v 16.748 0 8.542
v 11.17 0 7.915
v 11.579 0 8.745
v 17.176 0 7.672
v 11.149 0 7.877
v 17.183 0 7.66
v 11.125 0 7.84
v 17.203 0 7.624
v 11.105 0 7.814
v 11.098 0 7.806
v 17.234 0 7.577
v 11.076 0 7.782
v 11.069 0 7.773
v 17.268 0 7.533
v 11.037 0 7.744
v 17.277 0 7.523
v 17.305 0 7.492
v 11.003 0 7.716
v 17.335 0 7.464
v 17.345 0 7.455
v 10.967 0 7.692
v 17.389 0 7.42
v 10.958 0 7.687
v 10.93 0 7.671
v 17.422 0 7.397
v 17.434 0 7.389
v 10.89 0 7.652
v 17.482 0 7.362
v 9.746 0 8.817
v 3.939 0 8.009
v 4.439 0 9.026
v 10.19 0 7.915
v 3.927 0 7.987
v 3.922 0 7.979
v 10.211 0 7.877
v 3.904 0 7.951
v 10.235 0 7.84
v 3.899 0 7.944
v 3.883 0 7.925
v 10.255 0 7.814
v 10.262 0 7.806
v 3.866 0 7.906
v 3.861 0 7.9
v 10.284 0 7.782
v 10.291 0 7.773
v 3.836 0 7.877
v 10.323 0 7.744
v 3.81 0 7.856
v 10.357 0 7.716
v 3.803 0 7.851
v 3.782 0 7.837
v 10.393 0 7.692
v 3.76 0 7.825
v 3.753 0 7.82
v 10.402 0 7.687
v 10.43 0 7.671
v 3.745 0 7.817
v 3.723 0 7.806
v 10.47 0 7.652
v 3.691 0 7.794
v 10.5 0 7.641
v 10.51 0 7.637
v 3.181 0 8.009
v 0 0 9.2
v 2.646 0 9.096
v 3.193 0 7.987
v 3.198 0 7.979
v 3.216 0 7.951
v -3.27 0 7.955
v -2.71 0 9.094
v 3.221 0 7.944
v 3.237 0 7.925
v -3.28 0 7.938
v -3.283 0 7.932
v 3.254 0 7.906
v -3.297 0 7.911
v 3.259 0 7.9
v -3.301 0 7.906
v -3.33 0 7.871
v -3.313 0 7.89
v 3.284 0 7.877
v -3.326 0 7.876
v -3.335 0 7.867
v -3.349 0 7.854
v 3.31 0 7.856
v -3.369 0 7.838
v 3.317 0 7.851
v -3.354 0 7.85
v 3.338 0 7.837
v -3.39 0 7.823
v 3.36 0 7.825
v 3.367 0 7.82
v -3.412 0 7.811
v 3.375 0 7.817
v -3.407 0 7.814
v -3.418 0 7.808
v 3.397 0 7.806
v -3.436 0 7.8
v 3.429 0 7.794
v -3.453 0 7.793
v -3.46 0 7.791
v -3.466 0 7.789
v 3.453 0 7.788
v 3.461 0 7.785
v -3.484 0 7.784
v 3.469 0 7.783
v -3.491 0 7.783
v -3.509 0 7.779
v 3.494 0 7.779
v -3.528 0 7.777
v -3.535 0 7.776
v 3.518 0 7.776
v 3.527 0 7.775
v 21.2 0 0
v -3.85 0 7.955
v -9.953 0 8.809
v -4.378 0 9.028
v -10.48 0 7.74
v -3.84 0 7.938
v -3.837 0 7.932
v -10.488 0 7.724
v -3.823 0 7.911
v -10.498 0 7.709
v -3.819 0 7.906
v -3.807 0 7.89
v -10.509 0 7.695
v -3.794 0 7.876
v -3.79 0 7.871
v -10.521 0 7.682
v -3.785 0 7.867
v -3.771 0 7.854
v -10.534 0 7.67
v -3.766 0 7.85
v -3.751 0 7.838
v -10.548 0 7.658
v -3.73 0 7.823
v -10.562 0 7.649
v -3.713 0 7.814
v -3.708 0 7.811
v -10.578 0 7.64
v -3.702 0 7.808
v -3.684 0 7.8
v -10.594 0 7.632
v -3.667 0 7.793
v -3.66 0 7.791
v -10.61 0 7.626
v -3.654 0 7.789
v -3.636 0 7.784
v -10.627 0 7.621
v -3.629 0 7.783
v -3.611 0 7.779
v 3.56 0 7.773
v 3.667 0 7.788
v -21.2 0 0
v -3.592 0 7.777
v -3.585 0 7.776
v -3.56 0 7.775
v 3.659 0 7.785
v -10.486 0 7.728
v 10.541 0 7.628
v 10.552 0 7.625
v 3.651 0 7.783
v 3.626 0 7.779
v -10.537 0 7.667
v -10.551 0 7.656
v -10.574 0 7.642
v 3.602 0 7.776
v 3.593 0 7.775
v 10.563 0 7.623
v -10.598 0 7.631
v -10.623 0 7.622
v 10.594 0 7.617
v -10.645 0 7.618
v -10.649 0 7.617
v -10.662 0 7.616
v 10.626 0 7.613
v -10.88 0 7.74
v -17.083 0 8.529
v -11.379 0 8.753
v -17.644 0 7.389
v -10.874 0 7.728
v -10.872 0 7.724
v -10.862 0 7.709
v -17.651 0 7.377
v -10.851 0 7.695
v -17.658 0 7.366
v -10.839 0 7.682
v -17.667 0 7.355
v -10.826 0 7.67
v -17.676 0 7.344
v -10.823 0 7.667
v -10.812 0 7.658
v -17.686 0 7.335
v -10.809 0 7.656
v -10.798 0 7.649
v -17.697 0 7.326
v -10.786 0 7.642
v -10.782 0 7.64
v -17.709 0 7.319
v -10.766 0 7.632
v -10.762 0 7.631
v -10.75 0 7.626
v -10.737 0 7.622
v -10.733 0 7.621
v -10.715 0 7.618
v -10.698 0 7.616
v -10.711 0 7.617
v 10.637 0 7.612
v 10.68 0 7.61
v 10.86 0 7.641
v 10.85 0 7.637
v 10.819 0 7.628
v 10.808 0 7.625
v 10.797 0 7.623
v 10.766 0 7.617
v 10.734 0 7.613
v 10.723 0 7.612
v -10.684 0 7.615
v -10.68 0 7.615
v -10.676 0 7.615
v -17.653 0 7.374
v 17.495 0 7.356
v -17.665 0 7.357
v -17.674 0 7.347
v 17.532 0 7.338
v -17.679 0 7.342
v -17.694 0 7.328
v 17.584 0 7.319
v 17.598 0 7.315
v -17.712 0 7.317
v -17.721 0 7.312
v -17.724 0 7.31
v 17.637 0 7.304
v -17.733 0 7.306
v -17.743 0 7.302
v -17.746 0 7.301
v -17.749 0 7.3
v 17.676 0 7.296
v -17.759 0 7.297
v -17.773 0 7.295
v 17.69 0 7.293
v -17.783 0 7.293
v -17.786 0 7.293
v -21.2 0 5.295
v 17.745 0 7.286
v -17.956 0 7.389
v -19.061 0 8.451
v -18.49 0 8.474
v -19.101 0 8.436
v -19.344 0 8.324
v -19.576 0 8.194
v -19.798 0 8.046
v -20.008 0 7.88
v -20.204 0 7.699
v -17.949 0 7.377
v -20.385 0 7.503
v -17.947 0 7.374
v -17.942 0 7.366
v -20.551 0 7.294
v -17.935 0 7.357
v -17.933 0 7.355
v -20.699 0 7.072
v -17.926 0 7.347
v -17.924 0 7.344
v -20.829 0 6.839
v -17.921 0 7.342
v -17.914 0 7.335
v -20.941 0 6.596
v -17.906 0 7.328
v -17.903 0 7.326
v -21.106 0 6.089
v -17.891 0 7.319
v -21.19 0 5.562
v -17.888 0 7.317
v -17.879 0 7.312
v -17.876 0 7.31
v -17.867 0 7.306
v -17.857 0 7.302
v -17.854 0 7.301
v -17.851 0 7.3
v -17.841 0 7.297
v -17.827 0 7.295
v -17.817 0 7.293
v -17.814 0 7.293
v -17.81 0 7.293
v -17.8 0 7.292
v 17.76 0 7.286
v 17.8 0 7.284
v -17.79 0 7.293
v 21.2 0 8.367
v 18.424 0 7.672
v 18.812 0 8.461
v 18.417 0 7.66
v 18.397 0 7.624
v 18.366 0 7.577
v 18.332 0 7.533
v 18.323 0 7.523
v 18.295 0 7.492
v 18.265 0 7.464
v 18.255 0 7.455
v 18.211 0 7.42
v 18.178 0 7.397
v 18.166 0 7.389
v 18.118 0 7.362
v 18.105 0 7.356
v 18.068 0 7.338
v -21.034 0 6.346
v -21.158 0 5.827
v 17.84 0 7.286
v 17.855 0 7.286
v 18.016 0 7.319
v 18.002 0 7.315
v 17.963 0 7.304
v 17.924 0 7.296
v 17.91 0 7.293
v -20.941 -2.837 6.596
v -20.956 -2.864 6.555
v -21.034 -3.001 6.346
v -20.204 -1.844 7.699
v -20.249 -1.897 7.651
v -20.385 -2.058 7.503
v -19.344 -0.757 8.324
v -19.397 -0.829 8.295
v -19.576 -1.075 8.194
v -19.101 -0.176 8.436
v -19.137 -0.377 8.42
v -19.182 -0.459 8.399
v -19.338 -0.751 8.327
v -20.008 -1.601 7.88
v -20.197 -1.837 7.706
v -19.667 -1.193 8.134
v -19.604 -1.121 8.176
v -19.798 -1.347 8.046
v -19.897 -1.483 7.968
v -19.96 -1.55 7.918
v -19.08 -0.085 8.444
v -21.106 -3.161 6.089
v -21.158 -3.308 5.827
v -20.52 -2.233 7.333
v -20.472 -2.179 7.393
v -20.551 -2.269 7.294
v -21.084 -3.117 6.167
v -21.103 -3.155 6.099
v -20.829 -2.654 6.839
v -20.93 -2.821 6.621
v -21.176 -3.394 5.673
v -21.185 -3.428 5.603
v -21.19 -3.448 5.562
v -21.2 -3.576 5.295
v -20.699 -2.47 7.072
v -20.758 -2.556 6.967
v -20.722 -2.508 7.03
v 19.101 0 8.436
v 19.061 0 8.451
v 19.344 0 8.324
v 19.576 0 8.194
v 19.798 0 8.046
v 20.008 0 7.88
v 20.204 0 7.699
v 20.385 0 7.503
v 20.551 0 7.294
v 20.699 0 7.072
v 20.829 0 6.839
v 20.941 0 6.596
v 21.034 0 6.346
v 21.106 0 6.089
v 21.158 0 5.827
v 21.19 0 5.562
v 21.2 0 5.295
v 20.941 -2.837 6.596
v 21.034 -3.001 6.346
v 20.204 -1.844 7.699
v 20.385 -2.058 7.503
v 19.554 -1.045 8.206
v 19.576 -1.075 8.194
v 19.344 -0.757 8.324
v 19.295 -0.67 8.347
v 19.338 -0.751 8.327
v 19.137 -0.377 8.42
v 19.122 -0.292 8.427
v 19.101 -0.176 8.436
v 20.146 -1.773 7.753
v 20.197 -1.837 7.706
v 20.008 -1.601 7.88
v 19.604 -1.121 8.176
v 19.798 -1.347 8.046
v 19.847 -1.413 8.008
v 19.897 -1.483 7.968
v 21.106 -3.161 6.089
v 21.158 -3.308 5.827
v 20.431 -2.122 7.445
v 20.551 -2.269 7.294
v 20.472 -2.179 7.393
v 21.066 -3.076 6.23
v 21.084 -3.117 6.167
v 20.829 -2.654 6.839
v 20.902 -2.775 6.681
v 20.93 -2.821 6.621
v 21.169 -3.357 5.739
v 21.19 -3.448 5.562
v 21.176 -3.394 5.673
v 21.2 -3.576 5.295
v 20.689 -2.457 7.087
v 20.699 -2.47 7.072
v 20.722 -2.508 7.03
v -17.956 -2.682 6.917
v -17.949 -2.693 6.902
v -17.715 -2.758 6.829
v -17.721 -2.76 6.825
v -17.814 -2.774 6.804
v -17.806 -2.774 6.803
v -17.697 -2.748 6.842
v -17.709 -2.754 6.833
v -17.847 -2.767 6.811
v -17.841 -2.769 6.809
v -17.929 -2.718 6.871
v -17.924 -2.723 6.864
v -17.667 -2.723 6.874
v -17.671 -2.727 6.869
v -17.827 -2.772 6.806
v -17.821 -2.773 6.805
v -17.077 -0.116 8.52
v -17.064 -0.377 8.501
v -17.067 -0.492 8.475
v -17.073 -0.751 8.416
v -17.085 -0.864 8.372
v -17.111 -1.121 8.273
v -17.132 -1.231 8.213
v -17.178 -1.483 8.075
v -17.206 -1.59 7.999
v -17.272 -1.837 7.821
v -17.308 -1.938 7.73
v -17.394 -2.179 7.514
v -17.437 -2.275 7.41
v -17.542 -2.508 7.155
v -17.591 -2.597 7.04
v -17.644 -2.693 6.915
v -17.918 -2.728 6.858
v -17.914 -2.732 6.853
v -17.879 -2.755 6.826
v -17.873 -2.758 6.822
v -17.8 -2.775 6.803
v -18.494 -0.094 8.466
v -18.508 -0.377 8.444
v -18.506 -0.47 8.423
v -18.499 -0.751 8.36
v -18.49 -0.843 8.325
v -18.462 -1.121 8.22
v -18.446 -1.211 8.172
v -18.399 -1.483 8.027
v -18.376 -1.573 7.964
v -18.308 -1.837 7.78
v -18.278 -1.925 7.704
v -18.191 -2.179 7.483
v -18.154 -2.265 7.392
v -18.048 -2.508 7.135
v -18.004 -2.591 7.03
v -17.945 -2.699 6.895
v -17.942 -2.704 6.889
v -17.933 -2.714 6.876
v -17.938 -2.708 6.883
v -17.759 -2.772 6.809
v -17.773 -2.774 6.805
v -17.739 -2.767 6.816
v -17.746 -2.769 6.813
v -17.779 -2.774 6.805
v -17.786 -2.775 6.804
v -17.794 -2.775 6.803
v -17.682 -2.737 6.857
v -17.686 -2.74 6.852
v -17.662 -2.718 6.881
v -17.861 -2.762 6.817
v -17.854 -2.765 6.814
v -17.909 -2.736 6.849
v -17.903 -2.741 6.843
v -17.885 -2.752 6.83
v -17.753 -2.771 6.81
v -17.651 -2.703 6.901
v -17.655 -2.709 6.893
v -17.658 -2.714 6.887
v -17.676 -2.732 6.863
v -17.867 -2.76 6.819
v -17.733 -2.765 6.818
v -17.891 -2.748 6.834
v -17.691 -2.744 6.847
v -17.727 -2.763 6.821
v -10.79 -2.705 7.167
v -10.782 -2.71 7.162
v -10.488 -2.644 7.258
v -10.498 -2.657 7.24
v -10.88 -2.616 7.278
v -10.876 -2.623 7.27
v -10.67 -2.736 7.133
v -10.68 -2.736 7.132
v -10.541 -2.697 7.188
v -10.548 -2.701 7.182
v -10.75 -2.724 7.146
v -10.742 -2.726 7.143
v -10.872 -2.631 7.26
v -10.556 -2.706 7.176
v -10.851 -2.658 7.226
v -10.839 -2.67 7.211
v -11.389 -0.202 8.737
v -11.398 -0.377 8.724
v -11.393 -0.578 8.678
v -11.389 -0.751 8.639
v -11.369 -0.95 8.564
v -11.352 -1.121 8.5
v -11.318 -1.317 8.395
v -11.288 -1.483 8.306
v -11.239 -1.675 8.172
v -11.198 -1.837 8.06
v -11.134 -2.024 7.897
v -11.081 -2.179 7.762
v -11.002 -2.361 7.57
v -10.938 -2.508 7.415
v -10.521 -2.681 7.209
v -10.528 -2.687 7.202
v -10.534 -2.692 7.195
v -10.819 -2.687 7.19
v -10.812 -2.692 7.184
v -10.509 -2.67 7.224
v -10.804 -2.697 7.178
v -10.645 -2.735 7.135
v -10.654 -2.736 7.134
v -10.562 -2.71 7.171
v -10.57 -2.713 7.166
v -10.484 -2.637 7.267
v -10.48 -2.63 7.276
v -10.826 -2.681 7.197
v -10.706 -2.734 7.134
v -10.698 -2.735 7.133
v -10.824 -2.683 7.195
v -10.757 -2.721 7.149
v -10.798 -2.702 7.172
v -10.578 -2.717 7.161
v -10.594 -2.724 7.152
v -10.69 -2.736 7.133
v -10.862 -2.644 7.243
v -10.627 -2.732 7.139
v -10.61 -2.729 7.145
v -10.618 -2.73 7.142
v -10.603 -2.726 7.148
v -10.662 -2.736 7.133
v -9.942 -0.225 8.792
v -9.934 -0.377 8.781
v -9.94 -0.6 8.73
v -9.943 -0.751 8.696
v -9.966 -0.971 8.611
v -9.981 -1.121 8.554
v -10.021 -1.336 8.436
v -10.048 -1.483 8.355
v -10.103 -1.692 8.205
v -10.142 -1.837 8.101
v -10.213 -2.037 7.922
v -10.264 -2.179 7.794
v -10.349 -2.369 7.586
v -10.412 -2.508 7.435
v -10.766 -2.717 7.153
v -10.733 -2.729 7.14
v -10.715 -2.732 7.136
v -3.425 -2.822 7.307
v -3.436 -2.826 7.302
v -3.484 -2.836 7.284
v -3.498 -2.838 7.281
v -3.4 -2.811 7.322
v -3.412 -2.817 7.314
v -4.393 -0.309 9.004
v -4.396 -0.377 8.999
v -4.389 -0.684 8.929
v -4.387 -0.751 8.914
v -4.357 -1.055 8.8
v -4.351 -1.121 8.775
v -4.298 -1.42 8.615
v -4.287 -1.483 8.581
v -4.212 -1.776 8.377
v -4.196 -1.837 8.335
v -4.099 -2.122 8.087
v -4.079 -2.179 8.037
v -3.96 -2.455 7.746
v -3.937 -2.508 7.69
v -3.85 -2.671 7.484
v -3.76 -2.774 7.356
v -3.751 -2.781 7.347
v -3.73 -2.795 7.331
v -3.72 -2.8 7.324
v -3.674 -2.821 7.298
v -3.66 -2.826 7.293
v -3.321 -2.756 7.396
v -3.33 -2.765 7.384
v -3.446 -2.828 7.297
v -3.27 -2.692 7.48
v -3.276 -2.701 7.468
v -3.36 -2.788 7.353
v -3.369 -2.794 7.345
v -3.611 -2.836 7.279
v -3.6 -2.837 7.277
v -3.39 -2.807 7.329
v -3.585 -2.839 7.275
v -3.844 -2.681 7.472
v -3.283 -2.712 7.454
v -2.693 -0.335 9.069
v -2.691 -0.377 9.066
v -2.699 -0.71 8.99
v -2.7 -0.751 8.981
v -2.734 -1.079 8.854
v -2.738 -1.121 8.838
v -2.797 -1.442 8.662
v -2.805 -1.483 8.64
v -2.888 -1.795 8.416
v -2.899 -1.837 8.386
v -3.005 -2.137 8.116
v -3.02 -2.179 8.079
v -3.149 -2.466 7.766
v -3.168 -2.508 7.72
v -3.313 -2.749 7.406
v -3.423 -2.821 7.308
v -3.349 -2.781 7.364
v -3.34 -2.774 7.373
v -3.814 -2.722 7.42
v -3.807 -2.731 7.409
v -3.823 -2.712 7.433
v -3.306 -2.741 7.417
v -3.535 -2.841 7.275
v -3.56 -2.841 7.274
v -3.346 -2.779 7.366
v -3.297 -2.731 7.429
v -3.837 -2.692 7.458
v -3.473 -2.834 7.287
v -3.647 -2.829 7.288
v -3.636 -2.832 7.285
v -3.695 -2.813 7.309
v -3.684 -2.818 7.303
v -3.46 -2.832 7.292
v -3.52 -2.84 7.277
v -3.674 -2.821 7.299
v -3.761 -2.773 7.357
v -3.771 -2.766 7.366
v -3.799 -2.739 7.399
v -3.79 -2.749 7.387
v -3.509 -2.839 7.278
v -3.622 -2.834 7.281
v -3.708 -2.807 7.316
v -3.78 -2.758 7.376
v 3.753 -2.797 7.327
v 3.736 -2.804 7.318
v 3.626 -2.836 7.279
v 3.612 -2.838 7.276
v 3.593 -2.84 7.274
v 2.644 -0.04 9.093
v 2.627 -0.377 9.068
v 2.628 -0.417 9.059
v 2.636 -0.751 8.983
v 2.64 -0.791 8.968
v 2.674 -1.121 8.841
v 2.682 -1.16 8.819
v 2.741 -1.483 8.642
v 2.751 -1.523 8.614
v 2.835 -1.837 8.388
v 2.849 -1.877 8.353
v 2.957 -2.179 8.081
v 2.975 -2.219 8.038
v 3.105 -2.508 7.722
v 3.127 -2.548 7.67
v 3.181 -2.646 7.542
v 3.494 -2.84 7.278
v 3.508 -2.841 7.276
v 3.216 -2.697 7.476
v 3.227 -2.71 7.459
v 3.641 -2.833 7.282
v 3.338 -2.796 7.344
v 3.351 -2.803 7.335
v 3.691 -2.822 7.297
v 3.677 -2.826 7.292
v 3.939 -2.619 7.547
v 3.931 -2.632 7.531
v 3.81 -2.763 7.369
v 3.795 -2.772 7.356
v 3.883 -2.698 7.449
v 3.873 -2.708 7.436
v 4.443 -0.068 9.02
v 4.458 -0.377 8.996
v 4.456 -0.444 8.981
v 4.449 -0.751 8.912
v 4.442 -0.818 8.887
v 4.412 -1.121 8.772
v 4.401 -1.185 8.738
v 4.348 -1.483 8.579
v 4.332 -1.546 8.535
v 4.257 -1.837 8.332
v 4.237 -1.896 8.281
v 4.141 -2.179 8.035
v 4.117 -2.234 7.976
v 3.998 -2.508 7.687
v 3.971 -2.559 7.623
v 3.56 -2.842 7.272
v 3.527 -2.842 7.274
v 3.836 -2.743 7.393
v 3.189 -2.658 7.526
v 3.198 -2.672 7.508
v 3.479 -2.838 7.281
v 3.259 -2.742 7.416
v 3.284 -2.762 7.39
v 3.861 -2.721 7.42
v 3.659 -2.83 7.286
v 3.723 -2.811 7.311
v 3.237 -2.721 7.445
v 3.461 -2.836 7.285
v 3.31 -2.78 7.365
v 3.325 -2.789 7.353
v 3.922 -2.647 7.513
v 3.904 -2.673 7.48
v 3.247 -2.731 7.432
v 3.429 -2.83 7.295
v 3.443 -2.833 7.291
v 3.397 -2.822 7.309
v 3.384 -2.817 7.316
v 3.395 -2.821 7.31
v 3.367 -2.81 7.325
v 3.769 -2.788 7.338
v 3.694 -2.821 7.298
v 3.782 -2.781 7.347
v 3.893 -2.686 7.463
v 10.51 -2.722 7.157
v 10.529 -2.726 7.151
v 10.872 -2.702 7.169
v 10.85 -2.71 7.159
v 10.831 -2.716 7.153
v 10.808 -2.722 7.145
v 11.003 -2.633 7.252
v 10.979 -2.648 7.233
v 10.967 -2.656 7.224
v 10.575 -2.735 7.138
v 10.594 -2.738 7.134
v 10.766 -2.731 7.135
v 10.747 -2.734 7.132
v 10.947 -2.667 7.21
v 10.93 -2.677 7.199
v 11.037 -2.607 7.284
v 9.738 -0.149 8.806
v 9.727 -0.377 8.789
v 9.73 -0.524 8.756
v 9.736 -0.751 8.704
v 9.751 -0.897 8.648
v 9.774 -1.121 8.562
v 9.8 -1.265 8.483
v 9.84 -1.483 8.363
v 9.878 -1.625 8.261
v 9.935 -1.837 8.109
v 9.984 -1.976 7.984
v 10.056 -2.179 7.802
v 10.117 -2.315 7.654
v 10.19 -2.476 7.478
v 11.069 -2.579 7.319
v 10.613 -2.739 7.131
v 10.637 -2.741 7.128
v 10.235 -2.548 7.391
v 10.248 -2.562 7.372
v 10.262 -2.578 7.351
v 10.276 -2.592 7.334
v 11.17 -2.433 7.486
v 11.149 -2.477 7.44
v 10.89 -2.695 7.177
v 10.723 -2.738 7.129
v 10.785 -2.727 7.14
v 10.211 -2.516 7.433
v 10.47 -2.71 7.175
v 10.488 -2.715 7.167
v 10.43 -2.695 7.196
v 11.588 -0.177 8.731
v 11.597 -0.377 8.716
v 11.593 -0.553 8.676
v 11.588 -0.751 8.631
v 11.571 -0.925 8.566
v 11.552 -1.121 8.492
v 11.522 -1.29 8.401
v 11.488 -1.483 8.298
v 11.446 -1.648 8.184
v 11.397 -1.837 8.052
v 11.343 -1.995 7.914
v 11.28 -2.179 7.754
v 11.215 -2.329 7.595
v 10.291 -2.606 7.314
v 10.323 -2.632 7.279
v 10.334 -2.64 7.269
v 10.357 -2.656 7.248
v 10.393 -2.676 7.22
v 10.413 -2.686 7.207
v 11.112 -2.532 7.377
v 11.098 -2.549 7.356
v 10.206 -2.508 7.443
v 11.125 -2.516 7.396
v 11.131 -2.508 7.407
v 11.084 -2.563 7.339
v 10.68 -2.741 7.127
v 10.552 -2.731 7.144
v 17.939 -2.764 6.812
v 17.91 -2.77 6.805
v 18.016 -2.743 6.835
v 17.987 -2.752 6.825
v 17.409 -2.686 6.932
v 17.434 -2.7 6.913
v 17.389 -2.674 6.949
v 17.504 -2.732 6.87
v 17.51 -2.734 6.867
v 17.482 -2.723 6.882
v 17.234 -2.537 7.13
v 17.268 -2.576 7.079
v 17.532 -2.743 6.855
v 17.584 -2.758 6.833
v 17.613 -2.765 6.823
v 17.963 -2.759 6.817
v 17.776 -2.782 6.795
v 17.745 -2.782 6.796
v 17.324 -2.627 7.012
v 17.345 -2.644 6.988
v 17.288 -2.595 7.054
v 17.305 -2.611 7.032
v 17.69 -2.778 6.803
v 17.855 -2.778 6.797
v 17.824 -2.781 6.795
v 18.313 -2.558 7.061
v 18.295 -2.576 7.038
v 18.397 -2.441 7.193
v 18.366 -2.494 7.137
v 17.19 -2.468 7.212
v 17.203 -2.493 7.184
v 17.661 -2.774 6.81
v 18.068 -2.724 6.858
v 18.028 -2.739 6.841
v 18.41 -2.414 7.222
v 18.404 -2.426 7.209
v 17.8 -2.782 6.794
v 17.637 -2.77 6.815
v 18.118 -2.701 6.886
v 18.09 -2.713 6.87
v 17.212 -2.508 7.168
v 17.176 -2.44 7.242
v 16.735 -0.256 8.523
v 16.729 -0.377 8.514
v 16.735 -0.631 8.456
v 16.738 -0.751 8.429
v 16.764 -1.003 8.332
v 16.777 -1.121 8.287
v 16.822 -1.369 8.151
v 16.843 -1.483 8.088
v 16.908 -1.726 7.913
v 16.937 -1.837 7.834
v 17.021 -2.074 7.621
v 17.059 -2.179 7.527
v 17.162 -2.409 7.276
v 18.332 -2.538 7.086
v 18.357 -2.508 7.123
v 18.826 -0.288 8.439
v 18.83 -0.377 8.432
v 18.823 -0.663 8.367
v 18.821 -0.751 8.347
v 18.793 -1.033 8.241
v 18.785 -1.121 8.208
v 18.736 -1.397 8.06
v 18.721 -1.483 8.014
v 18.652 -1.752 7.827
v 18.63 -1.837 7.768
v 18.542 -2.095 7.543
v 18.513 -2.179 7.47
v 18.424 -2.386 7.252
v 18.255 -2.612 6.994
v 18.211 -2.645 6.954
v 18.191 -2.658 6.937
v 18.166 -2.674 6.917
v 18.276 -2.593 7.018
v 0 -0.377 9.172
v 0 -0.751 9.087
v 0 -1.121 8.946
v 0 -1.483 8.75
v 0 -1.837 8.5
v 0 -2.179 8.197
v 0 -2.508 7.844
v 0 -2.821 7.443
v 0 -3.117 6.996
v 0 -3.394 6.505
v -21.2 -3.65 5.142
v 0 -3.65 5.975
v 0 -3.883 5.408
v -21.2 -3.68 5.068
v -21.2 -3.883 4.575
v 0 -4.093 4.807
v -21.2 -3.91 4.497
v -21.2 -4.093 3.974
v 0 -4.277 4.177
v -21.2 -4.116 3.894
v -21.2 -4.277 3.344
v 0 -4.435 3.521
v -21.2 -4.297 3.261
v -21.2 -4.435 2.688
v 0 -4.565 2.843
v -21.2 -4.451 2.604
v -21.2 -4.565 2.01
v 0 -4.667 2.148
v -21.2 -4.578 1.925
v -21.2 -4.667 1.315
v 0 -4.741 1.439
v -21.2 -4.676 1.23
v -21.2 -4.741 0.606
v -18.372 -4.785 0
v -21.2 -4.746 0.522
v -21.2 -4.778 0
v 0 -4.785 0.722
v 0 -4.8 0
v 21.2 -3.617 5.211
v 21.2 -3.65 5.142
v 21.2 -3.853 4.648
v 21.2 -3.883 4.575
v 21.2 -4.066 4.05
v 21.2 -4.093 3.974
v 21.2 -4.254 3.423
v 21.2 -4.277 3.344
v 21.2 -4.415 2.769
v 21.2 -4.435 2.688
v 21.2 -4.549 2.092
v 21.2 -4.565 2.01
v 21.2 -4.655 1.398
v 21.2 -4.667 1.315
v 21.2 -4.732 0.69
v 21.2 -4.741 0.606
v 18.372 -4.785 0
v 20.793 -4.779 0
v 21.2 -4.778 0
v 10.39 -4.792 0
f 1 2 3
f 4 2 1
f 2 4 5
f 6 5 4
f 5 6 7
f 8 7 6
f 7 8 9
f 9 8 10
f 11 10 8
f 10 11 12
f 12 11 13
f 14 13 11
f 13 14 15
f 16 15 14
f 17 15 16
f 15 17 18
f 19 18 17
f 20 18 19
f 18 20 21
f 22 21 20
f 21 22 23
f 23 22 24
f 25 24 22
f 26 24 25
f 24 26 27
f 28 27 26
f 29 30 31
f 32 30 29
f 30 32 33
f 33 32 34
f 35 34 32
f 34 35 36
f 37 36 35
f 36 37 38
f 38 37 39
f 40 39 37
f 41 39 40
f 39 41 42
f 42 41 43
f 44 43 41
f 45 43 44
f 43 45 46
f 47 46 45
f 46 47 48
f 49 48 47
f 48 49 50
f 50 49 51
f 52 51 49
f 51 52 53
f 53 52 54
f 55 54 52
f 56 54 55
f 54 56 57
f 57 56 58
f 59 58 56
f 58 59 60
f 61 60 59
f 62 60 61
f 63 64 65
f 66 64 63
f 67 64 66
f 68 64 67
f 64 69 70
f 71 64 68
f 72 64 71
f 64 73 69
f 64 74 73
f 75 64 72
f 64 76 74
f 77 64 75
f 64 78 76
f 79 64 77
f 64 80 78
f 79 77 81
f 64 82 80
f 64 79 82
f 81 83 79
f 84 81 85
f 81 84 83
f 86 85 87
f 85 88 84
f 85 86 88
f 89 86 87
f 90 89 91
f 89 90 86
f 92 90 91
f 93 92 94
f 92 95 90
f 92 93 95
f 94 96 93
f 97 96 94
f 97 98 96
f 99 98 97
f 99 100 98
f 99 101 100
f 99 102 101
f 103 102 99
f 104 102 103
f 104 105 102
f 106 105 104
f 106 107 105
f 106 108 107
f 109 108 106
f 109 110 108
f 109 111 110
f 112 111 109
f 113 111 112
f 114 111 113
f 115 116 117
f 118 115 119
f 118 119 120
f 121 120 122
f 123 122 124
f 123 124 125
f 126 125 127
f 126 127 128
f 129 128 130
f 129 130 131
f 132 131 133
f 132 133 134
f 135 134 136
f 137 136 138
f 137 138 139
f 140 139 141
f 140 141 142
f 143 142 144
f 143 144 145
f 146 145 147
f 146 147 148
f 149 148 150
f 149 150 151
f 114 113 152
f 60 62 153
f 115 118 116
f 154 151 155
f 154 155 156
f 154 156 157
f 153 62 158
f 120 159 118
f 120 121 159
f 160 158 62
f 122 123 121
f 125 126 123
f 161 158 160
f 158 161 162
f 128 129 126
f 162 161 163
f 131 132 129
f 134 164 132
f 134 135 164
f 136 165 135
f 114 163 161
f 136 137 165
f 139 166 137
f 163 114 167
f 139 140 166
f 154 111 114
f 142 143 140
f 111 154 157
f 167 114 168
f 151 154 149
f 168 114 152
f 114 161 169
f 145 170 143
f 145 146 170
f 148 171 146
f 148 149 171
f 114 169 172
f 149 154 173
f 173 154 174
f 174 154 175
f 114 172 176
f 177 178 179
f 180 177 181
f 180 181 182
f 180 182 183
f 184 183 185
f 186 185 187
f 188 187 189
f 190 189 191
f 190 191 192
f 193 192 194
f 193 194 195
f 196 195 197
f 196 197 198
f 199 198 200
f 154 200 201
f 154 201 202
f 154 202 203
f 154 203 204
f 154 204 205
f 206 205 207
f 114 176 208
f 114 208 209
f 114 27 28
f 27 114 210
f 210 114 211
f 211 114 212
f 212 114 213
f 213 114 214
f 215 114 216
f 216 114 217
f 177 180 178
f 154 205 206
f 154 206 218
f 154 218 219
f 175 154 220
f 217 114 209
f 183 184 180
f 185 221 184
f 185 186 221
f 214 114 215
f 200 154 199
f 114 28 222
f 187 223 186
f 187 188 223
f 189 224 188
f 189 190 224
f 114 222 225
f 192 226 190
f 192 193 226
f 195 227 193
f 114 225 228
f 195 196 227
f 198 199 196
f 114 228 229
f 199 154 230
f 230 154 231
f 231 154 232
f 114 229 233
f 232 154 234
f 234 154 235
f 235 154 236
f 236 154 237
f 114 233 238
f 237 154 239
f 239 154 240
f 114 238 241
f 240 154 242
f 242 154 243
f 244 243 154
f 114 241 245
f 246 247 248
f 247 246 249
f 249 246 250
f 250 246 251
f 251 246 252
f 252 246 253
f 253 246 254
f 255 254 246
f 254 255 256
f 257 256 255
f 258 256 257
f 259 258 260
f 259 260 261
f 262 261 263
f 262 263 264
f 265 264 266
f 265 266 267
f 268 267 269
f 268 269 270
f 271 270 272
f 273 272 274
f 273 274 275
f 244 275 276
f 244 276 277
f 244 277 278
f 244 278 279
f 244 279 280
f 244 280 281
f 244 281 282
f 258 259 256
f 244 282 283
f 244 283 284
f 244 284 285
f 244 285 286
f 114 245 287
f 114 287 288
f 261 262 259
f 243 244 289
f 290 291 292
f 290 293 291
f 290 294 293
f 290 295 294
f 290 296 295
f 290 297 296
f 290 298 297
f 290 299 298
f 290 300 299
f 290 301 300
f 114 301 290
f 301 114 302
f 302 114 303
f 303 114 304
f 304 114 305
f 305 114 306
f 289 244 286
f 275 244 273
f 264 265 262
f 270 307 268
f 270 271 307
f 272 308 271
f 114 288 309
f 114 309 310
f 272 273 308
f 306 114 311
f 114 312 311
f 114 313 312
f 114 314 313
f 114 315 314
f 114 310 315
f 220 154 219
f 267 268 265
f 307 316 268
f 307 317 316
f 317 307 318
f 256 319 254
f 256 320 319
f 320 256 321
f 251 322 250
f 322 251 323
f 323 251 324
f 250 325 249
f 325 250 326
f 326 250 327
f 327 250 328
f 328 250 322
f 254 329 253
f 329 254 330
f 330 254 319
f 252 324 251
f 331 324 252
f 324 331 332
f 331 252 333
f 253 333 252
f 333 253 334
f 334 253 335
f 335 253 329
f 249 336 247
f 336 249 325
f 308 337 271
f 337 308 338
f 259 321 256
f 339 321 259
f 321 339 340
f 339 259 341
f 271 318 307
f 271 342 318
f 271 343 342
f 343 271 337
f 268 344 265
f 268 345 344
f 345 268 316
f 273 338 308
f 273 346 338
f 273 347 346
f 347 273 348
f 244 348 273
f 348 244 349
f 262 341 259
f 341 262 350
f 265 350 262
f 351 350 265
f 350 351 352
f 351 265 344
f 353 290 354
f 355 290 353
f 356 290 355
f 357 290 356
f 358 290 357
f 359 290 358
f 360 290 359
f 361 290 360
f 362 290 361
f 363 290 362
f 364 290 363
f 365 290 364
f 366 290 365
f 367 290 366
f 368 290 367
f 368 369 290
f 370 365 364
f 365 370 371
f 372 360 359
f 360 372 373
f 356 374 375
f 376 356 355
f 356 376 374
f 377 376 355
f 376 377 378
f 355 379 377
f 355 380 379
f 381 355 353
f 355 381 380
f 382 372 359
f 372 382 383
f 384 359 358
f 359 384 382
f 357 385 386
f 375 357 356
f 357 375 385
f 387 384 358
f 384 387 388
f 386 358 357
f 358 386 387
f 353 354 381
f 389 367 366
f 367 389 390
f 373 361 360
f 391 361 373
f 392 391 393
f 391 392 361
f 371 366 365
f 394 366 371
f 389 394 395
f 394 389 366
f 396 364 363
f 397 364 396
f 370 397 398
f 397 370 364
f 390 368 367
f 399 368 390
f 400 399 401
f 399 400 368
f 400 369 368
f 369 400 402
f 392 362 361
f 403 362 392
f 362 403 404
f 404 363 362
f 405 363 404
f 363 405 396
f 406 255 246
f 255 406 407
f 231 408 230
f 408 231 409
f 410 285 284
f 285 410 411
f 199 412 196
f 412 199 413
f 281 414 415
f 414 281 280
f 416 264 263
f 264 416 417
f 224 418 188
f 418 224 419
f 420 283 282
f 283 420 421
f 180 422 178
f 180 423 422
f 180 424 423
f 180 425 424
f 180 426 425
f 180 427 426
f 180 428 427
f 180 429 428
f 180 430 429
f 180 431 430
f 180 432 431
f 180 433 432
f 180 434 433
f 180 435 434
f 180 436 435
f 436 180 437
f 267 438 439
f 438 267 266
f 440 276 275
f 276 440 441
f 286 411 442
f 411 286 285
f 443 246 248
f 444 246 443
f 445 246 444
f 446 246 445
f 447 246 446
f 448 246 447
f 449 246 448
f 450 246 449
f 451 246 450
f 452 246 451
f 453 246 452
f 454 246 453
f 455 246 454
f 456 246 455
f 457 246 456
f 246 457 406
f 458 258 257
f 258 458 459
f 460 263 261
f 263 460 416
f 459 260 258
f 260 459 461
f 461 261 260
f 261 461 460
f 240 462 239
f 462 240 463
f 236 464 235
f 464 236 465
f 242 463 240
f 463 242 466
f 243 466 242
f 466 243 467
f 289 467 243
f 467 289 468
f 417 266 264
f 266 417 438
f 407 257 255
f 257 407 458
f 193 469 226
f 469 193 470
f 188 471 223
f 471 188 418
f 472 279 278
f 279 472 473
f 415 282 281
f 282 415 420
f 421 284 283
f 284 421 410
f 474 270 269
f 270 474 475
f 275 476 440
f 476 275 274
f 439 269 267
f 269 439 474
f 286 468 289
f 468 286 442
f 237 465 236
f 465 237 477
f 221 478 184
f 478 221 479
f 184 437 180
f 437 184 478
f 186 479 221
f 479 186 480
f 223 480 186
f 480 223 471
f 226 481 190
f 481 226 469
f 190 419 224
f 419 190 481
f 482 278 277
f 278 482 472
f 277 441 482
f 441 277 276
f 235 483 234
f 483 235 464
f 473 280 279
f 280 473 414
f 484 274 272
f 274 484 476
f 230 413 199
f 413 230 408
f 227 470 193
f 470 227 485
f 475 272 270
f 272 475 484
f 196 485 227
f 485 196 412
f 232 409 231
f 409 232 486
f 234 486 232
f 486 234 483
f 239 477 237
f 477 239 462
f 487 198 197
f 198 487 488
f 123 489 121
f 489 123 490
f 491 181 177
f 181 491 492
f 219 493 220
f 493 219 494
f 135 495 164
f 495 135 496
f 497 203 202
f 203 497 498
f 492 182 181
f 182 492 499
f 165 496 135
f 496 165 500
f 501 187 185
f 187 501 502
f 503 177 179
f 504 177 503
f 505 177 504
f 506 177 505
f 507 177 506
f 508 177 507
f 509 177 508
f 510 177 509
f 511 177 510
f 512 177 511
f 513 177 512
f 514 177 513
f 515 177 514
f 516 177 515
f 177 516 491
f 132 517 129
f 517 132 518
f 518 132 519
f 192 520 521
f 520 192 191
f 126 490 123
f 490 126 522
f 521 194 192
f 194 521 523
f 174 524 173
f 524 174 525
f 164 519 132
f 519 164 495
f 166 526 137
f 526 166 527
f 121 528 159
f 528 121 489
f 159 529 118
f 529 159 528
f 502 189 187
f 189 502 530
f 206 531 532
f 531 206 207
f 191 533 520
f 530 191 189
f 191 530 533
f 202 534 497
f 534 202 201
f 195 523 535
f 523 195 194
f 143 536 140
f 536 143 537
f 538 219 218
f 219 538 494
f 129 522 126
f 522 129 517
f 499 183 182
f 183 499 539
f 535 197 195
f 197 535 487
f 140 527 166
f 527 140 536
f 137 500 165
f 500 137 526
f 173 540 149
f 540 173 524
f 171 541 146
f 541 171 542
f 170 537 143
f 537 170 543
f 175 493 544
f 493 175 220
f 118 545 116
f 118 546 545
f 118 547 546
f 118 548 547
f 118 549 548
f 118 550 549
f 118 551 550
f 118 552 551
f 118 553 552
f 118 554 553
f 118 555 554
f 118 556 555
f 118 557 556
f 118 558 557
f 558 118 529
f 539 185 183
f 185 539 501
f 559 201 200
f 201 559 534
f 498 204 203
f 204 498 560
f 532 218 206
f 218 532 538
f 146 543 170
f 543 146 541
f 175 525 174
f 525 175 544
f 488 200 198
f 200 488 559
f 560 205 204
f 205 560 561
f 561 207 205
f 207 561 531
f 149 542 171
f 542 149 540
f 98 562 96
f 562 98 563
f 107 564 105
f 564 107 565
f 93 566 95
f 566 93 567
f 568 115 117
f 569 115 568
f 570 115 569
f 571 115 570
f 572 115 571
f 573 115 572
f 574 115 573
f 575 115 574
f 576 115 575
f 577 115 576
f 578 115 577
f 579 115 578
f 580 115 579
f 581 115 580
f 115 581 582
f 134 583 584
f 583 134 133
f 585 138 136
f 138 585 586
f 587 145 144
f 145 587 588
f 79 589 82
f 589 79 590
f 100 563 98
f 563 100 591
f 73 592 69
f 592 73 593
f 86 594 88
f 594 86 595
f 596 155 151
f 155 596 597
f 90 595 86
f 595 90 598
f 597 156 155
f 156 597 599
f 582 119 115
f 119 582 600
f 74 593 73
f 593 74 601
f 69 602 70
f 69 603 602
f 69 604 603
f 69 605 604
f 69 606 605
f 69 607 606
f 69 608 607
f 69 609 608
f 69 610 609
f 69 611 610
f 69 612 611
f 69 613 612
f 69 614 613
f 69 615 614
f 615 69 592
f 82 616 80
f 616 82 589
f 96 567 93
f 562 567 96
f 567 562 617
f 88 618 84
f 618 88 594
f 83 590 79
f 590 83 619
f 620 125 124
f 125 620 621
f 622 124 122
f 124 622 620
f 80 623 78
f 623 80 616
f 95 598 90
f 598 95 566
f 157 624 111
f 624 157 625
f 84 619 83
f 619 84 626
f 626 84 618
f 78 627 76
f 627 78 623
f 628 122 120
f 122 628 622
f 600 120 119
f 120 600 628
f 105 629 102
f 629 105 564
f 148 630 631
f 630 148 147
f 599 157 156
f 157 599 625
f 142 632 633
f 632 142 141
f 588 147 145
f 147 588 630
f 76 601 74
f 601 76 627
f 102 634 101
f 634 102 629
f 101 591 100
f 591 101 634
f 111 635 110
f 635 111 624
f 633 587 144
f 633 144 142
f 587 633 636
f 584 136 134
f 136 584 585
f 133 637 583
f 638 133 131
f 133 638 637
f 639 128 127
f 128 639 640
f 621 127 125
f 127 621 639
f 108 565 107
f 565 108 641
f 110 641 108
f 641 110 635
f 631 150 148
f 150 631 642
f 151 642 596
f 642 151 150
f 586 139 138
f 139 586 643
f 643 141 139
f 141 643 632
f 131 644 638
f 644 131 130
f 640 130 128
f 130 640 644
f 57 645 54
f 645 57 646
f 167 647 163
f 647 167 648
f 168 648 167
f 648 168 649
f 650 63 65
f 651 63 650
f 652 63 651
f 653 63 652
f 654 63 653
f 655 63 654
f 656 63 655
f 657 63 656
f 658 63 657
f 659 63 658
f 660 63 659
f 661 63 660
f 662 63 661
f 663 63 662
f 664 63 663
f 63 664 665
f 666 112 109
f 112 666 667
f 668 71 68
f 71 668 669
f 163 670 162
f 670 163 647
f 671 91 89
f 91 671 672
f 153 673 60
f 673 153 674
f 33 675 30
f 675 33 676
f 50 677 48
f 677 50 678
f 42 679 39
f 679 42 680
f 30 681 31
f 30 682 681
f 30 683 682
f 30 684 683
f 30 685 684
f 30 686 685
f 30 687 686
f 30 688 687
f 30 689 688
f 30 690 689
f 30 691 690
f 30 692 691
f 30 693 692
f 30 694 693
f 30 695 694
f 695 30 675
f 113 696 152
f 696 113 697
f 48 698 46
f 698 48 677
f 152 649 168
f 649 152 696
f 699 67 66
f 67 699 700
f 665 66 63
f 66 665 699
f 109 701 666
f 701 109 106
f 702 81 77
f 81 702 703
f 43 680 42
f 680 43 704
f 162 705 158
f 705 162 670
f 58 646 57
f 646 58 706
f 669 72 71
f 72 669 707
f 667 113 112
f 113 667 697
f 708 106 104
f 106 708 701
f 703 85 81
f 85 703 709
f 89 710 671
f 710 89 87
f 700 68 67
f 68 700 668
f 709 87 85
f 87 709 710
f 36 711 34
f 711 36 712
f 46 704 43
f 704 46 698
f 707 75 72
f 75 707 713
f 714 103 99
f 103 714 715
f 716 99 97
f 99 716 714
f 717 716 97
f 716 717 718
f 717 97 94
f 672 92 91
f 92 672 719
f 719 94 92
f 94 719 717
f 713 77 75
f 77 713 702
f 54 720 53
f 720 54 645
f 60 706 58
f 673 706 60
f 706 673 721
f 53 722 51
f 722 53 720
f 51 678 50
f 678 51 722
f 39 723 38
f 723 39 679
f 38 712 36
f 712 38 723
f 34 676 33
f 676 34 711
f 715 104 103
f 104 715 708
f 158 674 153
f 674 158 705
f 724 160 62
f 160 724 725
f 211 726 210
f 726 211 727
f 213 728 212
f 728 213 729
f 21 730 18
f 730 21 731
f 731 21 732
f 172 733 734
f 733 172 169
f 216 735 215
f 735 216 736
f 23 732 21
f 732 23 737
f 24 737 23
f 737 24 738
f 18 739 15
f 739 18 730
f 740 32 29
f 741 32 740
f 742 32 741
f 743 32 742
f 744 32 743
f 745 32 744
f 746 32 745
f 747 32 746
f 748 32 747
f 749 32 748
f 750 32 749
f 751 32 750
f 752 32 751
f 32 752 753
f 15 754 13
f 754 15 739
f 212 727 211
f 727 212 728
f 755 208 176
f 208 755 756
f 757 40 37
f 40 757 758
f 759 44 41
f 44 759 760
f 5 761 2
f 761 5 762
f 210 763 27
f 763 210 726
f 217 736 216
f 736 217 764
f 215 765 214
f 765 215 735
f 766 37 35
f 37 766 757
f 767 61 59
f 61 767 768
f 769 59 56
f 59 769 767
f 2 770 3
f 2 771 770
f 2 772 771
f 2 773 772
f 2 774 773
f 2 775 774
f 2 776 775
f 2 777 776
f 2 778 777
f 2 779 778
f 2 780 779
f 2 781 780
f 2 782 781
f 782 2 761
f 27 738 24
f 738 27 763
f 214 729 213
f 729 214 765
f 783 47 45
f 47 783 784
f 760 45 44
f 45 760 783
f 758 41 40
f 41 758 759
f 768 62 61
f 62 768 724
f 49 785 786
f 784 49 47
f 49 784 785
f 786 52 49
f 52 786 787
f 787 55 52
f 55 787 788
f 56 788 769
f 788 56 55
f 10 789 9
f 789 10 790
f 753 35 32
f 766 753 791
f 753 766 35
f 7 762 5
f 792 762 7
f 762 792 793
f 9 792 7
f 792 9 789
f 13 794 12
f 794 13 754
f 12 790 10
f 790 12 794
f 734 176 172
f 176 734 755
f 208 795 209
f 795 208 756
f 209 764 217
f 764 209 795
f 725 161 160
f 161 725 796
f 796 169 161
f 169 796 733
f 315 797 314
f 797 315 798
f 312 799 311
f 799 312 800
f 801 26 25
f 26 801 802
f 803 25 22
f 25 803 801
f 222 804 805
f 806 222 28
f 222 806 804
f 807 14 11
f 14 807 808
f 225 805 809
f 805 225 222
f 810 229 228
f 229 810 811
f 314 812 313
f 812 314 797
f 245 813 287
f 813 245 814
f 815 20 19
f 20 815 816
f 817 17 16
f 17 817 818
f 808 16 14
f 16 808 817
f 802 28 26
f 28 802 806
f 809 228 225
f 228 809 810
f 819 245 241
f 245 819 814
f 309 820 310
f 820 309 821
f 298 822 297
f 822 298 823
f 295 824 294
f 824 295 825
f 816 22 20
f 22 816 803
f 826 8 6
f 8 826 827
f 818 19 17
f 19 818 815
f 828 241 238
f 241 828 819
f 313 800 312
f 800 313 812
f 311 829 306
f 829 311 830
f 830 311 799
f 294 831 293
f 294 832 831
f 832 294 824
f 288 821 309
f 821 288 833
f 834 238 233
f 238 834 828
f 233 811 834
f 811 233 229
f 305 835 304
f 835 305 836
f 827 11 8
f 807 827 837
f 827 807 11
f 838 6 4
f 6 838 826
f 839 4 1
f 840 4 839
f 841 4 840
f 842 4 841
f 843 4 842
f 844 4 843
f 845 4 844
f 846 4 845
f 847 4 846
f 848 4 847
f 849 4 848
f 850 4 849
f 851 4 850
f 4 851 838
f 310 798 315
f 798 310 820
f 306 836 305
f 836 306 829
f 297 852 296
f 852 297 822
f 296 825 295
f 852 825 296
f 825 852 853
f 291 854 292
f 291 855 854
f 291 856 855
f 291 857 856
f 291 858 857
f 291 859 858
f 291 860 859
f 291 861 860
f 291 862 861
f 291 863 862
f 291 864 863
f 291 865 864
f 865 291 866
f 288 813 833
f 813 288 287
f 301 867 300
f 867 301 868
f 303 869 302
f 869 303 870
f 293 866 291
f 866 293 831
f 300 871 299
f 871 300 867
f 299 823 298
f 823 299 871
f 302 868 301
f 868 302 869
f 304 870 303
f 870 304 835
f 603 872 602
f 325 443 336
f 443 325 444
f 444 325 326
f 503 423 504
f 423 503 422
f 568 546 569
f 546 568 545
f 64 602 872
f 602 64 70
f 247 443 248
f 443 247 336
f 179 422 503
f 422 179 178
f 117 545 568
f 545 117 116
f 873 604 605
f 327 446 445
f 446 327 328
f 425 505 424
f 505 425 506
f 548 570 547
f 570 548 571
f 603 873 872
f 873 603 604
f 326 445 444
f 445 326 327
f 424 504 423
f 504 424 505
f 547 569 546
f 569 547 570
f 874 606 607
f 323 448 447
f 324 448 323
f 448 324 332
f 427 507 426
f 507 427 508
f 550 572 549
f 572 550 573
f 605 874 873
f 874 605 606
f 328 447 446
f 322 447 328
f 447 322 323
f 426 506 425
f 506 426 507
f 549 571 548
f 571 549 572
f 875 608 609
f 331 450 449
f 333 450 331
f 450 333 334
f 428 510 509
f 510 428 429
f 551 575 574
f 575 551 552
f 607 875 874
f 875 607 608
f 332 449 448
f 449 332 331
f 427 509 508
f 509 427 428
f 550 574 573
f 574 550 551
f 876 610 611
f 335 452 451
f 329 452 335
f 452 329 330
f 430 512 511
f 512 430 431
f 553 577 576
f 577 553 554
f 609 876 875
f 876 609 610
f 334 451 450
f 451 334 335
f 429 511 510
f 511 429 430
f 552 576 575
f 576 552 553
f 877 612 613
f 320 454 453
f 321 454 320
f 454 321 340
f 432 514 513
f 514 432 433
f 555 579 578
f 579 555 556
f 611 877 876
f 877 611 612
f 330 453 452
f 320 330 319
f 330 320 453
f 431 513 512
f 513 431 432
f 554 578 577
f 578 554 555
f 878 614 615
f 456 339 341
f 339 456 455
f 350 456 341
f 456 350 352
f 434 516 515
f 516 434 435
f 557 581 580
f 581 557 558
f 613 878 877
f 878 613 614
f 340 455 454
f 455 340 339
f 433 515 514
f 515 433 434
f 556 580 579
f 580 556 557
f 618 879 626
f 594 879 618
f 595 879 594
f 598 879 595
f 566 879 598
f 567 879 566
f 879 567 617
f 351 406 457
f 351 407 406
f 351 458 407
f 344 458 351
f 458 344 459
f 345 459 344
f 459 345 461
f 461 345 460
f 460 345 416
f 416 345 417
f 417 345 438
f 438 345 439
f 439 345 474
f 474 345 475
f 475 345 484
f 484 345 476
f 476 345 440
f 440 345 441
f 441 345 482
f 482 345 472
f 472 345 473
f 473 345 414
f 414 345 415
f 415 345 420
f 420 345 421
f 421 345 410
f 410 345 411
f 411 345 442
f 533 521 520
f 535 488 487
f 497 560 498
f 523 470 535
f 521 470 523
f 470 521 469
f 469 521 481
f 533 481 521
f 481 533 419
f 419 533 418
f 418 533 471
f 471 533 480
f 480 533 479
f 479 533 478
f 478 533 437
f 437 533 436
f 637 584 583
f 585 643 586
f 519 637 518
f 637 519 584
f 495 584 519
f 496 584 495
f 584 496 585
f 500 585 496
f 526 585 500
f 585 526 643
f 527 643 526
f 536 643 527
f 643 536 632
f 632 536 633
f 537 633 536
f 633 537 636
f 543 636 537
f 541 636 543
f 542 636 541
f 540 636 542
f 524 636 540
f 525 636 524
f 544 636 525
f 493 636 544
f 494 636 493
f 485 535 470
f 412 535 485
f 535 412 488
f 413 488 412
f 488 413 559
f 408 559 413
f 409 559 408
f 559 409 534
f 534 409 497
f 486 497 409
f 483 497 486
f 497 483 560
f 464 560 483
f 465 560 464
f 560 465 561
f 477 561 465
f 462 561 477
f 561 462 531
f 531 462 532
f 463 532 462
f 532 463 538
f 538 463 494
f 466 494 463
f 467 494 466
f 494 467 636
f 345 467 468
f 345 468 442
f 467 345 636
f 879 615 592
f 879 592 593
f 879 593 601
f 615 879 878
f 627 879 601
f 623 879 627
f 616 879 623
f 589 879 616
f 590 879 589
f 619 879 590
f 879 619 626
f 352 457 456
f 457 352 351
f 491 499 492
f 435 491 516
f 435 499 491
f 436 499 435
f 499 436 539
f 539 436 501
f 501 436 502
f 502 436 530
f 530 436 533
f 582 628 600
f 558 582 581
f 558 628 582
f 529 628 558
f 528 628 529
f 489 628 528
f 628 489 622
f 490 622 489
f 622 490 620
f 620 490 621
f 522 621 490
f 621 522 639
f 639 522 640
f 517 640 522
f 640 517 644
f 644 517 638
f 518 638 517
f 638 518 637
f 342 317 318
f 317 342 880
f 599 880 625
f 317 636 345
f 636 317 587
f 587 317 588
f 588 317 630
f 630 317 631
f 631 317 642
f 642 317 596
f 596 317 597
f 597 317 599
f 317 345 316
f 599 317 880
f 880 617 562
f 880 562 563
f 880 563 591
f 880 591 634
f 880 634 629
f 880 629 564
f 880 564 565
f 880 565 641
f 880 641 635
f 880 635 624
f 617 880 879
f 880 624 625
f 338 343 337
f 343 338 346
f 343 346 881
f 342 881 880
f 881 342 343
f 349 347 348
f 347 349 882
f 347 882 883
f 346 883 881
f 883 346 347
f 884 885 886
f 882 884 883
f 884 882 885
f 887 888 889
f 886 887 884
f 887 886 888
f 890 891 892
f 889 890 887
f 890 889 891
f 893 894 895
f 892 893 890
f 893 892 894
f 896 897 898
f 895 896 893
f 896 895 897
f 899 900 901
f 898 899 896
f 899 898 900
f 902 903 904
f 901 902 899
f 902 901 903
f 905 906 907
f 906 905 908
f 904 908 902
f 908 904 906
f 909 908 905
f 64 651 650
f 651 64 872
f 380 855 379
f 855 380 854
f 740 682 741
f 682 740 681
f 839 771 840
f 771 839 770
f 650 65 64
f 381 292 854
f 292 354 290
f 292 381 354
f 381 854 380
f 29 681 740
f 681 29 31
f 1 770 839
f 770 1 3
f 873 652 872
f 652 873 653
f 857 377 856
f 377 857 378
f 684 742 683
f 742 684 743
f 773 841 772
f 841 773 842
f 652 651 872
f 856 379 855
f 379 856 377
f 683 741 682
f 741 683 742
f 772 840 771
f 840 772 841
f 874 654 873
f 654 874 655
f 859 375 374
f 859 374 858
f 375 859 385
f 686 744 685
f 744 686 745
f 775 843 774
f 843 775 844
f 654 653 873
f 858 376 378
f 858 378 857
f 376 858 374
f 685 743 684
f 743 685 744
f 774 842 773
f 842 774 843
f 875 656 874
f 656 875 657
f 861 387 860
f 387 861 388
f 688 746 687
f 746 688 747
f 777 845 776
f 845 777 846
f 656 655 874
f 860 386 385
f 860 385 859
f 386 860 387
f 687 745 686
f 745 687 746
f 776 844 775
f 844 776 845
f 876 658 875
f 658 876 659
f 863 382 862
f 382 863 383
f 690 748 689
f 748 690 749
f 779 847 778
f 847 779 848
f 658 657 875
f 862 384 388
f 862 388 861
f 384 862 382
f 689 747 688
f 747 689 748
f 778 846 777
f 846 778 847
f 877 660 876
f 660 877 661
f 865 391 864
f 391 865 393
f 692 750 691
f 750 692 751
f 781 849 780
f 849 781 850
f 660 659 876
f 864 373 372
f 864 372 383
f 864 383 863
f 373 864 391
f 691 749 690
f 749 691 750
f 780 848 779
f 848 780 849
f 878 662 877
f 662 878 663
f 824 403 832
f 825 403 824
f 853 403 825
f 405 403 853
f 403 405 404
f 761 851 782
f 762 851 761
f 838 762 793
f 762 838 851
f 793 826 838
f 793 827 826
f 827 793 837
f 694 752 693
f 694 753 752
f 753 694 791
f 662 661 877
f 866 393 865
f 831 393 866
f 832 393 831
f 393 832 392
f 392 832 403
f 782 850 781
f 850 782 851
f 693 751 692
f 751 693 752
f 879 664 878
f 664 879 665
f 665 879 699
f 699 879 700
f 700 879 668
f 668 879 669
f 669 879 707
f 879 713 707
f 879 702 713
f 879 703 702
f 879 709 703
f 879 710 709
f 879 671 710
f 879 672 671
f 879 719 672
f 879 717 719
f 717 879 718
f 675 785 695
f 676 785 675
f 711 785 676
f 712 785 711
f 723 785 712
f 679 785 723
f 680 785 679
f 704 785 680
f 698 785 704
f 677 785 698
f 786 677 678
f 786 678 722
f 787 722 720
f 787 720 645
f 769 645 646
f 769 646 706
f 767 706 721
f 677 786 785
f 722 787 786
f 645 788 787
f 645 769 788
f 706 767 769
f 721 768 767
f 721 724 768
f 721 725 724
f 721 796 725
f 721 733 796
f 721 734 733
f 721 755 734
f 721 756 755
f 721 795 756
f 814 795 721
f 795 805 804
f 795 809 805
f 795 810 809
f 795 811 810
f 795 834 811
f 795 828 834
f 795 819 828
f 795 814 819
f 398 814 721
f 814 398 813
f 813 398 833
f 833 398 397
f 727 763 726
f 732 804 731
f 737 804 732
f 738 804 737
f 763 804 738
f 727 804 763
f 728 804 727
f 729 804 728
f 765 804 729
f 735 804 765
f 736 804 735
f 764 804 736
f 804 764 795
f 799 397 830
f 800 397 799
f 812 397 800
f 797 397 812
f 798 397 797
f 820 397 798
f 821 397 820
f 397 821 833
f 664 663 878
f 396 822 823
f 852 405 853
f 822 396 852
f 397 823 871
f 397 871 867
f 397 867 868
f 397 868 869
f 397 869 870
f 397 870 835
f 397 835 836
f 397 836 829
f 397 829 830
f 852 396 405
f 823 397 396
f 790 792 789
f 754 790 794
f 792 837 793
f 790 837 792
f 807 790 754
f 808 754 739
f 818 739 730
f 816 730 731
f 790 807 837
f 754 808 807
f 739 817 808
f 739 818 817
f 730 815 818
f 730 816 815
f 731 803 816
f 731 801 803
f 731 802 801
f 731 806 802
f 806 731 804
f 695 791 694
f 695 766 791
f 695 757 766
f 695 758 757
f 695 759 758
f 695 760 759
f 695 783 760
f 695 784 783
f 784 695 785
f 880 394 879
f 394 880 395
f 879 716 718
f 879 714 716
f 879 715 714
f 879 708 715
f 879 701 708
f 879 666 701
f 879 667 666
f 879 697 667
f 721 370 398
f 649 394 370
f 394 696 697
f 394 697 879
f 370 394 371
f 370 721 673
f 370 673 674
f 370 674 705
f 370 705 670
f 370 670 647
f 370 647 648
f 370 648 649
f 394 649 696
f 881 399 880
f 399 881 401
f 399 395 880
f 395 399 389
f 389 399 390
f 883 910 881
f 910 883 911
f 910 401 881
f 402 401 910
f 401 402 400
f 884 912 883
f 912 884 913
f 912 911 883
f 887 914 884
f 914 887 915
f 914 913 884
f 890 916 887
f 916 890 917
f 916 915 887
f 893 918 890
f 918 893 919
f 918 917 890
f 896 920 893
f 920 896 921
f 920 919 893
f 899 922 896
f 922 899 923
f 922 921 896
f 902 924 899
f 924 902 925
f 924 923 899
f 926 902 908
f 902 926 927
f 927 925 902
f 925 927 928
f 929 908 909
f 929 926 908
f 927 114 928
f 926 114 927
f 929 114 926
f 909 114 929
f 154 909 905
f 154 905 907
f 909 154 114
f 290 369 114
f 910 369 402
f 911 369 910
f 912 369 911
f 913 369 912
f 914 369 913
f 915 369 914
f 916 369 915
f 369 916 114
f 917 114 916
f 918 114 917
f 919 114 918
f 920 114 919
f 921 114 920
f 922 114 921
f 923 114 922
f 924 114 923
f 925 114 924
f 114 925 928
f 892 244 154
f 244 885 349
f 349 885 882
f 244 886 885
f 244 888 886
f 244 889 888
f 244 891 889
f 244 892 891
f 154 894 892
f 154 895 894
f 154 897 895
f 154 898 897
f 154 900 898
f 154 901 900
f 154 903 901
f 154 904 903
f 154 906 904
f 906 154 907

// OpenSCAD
/*
Awesome customizable top nut uses true fretboard radius, true string diameter grooves and true string height setting.
It is also possible to adjust each string height if necessary.

Written by Torkel Borjeson 2018-08-02 <torkelb@gmail.com>
*/
echo(version=version());
$fn = 80*1; // To hide from Customizer

// Length of nut in direction of strings
nutLength = 4.8; 

// Width of nut
nutWidth = 42.4; 

// Radius of first fret, normally 12"
nutRadius = 304.8; 

// Distance from bottom of nut to bottom of strings. Measure nut slot height to fret board, add fret thickness and add extra clearance of about 0.75mm
stringHeight = 7.8; 

numberOfStrings = 6; //[2:7]

firstStringToLastStringDistance = 35.6;



// Set width of unused strings to 0 to not confuse
// algorithm to calculate thickest string

string1Diameter = 0.35;
string2Diameter = 0.45;
string3Diameter = 0.65;
string4Diameter = 0.85;
string5Diameter = 1.10;
string6Diameter = 1.40;
string7Diameter = 0.0;

stringDiameters = [
    string1Diameter,
    string2Diameter,
    string3Diameter,
    string4Diameter,
    string5Diameter,
    string6Diameter,
    string7Diameter];

// This way we can handle both right and left handed nuts 
thickestString = max(stringDiameters);

// Adjustment for string 1, positive value heightens string
string1HeightAdjust = 0.0; 

// Adjustment for string 2, positive value heightens string
string2HeightAdjust = 0.0; 

// Adjustment for string 3, positive value heightens string
string3HeightAdjust = 0.0; 

// Adjustment for string 4, positive value heightens string
string4HeightAdjust = 0.0; 

// Adjustment for string 5, positive value heightens string
string5HeightAdjust = 0.0; 

// Adjustment for string 6, positive value heightens string
string6HeightAdjust = 0.0; 

// Adjustment for string 7, positive value heightens string
string7HeightAdjust = 0.0; 

stringHeightAdjust = [
    string1HeightAdjust,
    string2HeightAdjust,
    string3HeightAdjust,
    string4HeightAdjust,
    string5HeightAdjust,
    string6HeightAdjust,
    string7HeightAdjust];
    
nutHeight = stringHeight + thickestString;
stringSpacing = firstStringToLastStringDistance/(numberOfStrings-1);
string1XOffset = (nutWidth - firstStringToLastStringDistance)/2; 
R = nutRadius + nutHeight;

// Angle of slot horizontally
stringAngle = 10;

module vSlot(diameter) {
    rotate([stringAngle, 0, 0]) {
        minkowski() {        
            cylinder(d=diameter, h=nutLength, center=true);
            resize([10,20])
                rotate([0,0,45]) 
                    cube([10, 10, nutLength], center=false);
        }
    }
}

module slot(stringNumber) {
    xPos = -nutWidth/2+string1XOffset + stringSpacing*(stringNumber-1);
    // Compensate so all strings will get same height to fret board
    heightCompensation = thickestString - stringDiameters[stringNumber-1];
    yPos = sqrt(R*R-xPos*xPos)-stringDiameters[stringNumber-1]/2 - heightCompensation + stringHeightAdjust[stringNumber-1];
    translate([xPos, yPos, 0])
        vSlot(stringDiameters[stringNumber-1]);
}

module torus() {
color("White")
    rotate_extrude() 
        translate([nutRadius, 0, 0])
            resize([nutHeight*2,nutLength*2])
                circle(d=20);
}

module delimiterBottom() {
    // Bottom part
    cube([nutRadius*2, nutRadius*2, 40], center=true);
}

module delimiterSide() {
    // Side delimiter
    translate([nutWidth/2+nutRadius, 0, 0])
        cube([nutRadius*2, nutRadius*3, 50], center=true);    
}

module delimiterSplit() {
    // Remove lower part of ellipse
    translate([-nutRadius, 0, -30])
        cube([nutRadius*2, nutRadius*2, 30], center=false);
}

module hollowCylinder(innerRadius, outerRadius, length) {
    color("pink") {
    difference() {
        cylinder(r=innerRadius*2, h=length, center=false);
        cylinder(r=innerRadius, h=length, center=false);
    }
}
}
module chamferCorner() {
    
    innerRadius = string1XOffset;
    xCenter = -nutWidth/2+innerRadius;
    yCenter = sqrt(R*R-xCenter*xCenter)-innerRadius;    
    translate([xCenter, yCenter, 0]) {
        difference() {
            hollowCylinder(innerRadius, innerRadius*2, nutLength);
        color("gray") { 
              cube([2*innerRadius, 2*innerRadius, nutLength], center=false);
        }
        rotate([180,90,90]) {
            translate([-nutLength,-2*innerRadius,0])
            color("green") { 
                cube([nutLength, 4*innerRadius, 2*innerRadius], center=false);
            }
            }
        }
    }
}

module removeTheRest() {
    translate([0, -nutRadius, 0])
        cube([nutRadius*2, nutRadius*2, 60], center=true);
}

module Nut() {
    rotate([90,0,0]) {
        translate([0, -nutRadius, 0]) {
            difference() {
                torus();
                delimiterBottom();
                delimiterSide();
                rotate([0,0,180])
                    delimiterSide();
                delimiterSplit();
                removeTheRest();
                chamferCorner();
                rotate([0, 180, 0])
                translate([0,0,-nutLength])
                chamferCorner();
                for (i=[1:numberOfStrings])
                    slot(i);
            }
        }
    }
}

Nut();
  
